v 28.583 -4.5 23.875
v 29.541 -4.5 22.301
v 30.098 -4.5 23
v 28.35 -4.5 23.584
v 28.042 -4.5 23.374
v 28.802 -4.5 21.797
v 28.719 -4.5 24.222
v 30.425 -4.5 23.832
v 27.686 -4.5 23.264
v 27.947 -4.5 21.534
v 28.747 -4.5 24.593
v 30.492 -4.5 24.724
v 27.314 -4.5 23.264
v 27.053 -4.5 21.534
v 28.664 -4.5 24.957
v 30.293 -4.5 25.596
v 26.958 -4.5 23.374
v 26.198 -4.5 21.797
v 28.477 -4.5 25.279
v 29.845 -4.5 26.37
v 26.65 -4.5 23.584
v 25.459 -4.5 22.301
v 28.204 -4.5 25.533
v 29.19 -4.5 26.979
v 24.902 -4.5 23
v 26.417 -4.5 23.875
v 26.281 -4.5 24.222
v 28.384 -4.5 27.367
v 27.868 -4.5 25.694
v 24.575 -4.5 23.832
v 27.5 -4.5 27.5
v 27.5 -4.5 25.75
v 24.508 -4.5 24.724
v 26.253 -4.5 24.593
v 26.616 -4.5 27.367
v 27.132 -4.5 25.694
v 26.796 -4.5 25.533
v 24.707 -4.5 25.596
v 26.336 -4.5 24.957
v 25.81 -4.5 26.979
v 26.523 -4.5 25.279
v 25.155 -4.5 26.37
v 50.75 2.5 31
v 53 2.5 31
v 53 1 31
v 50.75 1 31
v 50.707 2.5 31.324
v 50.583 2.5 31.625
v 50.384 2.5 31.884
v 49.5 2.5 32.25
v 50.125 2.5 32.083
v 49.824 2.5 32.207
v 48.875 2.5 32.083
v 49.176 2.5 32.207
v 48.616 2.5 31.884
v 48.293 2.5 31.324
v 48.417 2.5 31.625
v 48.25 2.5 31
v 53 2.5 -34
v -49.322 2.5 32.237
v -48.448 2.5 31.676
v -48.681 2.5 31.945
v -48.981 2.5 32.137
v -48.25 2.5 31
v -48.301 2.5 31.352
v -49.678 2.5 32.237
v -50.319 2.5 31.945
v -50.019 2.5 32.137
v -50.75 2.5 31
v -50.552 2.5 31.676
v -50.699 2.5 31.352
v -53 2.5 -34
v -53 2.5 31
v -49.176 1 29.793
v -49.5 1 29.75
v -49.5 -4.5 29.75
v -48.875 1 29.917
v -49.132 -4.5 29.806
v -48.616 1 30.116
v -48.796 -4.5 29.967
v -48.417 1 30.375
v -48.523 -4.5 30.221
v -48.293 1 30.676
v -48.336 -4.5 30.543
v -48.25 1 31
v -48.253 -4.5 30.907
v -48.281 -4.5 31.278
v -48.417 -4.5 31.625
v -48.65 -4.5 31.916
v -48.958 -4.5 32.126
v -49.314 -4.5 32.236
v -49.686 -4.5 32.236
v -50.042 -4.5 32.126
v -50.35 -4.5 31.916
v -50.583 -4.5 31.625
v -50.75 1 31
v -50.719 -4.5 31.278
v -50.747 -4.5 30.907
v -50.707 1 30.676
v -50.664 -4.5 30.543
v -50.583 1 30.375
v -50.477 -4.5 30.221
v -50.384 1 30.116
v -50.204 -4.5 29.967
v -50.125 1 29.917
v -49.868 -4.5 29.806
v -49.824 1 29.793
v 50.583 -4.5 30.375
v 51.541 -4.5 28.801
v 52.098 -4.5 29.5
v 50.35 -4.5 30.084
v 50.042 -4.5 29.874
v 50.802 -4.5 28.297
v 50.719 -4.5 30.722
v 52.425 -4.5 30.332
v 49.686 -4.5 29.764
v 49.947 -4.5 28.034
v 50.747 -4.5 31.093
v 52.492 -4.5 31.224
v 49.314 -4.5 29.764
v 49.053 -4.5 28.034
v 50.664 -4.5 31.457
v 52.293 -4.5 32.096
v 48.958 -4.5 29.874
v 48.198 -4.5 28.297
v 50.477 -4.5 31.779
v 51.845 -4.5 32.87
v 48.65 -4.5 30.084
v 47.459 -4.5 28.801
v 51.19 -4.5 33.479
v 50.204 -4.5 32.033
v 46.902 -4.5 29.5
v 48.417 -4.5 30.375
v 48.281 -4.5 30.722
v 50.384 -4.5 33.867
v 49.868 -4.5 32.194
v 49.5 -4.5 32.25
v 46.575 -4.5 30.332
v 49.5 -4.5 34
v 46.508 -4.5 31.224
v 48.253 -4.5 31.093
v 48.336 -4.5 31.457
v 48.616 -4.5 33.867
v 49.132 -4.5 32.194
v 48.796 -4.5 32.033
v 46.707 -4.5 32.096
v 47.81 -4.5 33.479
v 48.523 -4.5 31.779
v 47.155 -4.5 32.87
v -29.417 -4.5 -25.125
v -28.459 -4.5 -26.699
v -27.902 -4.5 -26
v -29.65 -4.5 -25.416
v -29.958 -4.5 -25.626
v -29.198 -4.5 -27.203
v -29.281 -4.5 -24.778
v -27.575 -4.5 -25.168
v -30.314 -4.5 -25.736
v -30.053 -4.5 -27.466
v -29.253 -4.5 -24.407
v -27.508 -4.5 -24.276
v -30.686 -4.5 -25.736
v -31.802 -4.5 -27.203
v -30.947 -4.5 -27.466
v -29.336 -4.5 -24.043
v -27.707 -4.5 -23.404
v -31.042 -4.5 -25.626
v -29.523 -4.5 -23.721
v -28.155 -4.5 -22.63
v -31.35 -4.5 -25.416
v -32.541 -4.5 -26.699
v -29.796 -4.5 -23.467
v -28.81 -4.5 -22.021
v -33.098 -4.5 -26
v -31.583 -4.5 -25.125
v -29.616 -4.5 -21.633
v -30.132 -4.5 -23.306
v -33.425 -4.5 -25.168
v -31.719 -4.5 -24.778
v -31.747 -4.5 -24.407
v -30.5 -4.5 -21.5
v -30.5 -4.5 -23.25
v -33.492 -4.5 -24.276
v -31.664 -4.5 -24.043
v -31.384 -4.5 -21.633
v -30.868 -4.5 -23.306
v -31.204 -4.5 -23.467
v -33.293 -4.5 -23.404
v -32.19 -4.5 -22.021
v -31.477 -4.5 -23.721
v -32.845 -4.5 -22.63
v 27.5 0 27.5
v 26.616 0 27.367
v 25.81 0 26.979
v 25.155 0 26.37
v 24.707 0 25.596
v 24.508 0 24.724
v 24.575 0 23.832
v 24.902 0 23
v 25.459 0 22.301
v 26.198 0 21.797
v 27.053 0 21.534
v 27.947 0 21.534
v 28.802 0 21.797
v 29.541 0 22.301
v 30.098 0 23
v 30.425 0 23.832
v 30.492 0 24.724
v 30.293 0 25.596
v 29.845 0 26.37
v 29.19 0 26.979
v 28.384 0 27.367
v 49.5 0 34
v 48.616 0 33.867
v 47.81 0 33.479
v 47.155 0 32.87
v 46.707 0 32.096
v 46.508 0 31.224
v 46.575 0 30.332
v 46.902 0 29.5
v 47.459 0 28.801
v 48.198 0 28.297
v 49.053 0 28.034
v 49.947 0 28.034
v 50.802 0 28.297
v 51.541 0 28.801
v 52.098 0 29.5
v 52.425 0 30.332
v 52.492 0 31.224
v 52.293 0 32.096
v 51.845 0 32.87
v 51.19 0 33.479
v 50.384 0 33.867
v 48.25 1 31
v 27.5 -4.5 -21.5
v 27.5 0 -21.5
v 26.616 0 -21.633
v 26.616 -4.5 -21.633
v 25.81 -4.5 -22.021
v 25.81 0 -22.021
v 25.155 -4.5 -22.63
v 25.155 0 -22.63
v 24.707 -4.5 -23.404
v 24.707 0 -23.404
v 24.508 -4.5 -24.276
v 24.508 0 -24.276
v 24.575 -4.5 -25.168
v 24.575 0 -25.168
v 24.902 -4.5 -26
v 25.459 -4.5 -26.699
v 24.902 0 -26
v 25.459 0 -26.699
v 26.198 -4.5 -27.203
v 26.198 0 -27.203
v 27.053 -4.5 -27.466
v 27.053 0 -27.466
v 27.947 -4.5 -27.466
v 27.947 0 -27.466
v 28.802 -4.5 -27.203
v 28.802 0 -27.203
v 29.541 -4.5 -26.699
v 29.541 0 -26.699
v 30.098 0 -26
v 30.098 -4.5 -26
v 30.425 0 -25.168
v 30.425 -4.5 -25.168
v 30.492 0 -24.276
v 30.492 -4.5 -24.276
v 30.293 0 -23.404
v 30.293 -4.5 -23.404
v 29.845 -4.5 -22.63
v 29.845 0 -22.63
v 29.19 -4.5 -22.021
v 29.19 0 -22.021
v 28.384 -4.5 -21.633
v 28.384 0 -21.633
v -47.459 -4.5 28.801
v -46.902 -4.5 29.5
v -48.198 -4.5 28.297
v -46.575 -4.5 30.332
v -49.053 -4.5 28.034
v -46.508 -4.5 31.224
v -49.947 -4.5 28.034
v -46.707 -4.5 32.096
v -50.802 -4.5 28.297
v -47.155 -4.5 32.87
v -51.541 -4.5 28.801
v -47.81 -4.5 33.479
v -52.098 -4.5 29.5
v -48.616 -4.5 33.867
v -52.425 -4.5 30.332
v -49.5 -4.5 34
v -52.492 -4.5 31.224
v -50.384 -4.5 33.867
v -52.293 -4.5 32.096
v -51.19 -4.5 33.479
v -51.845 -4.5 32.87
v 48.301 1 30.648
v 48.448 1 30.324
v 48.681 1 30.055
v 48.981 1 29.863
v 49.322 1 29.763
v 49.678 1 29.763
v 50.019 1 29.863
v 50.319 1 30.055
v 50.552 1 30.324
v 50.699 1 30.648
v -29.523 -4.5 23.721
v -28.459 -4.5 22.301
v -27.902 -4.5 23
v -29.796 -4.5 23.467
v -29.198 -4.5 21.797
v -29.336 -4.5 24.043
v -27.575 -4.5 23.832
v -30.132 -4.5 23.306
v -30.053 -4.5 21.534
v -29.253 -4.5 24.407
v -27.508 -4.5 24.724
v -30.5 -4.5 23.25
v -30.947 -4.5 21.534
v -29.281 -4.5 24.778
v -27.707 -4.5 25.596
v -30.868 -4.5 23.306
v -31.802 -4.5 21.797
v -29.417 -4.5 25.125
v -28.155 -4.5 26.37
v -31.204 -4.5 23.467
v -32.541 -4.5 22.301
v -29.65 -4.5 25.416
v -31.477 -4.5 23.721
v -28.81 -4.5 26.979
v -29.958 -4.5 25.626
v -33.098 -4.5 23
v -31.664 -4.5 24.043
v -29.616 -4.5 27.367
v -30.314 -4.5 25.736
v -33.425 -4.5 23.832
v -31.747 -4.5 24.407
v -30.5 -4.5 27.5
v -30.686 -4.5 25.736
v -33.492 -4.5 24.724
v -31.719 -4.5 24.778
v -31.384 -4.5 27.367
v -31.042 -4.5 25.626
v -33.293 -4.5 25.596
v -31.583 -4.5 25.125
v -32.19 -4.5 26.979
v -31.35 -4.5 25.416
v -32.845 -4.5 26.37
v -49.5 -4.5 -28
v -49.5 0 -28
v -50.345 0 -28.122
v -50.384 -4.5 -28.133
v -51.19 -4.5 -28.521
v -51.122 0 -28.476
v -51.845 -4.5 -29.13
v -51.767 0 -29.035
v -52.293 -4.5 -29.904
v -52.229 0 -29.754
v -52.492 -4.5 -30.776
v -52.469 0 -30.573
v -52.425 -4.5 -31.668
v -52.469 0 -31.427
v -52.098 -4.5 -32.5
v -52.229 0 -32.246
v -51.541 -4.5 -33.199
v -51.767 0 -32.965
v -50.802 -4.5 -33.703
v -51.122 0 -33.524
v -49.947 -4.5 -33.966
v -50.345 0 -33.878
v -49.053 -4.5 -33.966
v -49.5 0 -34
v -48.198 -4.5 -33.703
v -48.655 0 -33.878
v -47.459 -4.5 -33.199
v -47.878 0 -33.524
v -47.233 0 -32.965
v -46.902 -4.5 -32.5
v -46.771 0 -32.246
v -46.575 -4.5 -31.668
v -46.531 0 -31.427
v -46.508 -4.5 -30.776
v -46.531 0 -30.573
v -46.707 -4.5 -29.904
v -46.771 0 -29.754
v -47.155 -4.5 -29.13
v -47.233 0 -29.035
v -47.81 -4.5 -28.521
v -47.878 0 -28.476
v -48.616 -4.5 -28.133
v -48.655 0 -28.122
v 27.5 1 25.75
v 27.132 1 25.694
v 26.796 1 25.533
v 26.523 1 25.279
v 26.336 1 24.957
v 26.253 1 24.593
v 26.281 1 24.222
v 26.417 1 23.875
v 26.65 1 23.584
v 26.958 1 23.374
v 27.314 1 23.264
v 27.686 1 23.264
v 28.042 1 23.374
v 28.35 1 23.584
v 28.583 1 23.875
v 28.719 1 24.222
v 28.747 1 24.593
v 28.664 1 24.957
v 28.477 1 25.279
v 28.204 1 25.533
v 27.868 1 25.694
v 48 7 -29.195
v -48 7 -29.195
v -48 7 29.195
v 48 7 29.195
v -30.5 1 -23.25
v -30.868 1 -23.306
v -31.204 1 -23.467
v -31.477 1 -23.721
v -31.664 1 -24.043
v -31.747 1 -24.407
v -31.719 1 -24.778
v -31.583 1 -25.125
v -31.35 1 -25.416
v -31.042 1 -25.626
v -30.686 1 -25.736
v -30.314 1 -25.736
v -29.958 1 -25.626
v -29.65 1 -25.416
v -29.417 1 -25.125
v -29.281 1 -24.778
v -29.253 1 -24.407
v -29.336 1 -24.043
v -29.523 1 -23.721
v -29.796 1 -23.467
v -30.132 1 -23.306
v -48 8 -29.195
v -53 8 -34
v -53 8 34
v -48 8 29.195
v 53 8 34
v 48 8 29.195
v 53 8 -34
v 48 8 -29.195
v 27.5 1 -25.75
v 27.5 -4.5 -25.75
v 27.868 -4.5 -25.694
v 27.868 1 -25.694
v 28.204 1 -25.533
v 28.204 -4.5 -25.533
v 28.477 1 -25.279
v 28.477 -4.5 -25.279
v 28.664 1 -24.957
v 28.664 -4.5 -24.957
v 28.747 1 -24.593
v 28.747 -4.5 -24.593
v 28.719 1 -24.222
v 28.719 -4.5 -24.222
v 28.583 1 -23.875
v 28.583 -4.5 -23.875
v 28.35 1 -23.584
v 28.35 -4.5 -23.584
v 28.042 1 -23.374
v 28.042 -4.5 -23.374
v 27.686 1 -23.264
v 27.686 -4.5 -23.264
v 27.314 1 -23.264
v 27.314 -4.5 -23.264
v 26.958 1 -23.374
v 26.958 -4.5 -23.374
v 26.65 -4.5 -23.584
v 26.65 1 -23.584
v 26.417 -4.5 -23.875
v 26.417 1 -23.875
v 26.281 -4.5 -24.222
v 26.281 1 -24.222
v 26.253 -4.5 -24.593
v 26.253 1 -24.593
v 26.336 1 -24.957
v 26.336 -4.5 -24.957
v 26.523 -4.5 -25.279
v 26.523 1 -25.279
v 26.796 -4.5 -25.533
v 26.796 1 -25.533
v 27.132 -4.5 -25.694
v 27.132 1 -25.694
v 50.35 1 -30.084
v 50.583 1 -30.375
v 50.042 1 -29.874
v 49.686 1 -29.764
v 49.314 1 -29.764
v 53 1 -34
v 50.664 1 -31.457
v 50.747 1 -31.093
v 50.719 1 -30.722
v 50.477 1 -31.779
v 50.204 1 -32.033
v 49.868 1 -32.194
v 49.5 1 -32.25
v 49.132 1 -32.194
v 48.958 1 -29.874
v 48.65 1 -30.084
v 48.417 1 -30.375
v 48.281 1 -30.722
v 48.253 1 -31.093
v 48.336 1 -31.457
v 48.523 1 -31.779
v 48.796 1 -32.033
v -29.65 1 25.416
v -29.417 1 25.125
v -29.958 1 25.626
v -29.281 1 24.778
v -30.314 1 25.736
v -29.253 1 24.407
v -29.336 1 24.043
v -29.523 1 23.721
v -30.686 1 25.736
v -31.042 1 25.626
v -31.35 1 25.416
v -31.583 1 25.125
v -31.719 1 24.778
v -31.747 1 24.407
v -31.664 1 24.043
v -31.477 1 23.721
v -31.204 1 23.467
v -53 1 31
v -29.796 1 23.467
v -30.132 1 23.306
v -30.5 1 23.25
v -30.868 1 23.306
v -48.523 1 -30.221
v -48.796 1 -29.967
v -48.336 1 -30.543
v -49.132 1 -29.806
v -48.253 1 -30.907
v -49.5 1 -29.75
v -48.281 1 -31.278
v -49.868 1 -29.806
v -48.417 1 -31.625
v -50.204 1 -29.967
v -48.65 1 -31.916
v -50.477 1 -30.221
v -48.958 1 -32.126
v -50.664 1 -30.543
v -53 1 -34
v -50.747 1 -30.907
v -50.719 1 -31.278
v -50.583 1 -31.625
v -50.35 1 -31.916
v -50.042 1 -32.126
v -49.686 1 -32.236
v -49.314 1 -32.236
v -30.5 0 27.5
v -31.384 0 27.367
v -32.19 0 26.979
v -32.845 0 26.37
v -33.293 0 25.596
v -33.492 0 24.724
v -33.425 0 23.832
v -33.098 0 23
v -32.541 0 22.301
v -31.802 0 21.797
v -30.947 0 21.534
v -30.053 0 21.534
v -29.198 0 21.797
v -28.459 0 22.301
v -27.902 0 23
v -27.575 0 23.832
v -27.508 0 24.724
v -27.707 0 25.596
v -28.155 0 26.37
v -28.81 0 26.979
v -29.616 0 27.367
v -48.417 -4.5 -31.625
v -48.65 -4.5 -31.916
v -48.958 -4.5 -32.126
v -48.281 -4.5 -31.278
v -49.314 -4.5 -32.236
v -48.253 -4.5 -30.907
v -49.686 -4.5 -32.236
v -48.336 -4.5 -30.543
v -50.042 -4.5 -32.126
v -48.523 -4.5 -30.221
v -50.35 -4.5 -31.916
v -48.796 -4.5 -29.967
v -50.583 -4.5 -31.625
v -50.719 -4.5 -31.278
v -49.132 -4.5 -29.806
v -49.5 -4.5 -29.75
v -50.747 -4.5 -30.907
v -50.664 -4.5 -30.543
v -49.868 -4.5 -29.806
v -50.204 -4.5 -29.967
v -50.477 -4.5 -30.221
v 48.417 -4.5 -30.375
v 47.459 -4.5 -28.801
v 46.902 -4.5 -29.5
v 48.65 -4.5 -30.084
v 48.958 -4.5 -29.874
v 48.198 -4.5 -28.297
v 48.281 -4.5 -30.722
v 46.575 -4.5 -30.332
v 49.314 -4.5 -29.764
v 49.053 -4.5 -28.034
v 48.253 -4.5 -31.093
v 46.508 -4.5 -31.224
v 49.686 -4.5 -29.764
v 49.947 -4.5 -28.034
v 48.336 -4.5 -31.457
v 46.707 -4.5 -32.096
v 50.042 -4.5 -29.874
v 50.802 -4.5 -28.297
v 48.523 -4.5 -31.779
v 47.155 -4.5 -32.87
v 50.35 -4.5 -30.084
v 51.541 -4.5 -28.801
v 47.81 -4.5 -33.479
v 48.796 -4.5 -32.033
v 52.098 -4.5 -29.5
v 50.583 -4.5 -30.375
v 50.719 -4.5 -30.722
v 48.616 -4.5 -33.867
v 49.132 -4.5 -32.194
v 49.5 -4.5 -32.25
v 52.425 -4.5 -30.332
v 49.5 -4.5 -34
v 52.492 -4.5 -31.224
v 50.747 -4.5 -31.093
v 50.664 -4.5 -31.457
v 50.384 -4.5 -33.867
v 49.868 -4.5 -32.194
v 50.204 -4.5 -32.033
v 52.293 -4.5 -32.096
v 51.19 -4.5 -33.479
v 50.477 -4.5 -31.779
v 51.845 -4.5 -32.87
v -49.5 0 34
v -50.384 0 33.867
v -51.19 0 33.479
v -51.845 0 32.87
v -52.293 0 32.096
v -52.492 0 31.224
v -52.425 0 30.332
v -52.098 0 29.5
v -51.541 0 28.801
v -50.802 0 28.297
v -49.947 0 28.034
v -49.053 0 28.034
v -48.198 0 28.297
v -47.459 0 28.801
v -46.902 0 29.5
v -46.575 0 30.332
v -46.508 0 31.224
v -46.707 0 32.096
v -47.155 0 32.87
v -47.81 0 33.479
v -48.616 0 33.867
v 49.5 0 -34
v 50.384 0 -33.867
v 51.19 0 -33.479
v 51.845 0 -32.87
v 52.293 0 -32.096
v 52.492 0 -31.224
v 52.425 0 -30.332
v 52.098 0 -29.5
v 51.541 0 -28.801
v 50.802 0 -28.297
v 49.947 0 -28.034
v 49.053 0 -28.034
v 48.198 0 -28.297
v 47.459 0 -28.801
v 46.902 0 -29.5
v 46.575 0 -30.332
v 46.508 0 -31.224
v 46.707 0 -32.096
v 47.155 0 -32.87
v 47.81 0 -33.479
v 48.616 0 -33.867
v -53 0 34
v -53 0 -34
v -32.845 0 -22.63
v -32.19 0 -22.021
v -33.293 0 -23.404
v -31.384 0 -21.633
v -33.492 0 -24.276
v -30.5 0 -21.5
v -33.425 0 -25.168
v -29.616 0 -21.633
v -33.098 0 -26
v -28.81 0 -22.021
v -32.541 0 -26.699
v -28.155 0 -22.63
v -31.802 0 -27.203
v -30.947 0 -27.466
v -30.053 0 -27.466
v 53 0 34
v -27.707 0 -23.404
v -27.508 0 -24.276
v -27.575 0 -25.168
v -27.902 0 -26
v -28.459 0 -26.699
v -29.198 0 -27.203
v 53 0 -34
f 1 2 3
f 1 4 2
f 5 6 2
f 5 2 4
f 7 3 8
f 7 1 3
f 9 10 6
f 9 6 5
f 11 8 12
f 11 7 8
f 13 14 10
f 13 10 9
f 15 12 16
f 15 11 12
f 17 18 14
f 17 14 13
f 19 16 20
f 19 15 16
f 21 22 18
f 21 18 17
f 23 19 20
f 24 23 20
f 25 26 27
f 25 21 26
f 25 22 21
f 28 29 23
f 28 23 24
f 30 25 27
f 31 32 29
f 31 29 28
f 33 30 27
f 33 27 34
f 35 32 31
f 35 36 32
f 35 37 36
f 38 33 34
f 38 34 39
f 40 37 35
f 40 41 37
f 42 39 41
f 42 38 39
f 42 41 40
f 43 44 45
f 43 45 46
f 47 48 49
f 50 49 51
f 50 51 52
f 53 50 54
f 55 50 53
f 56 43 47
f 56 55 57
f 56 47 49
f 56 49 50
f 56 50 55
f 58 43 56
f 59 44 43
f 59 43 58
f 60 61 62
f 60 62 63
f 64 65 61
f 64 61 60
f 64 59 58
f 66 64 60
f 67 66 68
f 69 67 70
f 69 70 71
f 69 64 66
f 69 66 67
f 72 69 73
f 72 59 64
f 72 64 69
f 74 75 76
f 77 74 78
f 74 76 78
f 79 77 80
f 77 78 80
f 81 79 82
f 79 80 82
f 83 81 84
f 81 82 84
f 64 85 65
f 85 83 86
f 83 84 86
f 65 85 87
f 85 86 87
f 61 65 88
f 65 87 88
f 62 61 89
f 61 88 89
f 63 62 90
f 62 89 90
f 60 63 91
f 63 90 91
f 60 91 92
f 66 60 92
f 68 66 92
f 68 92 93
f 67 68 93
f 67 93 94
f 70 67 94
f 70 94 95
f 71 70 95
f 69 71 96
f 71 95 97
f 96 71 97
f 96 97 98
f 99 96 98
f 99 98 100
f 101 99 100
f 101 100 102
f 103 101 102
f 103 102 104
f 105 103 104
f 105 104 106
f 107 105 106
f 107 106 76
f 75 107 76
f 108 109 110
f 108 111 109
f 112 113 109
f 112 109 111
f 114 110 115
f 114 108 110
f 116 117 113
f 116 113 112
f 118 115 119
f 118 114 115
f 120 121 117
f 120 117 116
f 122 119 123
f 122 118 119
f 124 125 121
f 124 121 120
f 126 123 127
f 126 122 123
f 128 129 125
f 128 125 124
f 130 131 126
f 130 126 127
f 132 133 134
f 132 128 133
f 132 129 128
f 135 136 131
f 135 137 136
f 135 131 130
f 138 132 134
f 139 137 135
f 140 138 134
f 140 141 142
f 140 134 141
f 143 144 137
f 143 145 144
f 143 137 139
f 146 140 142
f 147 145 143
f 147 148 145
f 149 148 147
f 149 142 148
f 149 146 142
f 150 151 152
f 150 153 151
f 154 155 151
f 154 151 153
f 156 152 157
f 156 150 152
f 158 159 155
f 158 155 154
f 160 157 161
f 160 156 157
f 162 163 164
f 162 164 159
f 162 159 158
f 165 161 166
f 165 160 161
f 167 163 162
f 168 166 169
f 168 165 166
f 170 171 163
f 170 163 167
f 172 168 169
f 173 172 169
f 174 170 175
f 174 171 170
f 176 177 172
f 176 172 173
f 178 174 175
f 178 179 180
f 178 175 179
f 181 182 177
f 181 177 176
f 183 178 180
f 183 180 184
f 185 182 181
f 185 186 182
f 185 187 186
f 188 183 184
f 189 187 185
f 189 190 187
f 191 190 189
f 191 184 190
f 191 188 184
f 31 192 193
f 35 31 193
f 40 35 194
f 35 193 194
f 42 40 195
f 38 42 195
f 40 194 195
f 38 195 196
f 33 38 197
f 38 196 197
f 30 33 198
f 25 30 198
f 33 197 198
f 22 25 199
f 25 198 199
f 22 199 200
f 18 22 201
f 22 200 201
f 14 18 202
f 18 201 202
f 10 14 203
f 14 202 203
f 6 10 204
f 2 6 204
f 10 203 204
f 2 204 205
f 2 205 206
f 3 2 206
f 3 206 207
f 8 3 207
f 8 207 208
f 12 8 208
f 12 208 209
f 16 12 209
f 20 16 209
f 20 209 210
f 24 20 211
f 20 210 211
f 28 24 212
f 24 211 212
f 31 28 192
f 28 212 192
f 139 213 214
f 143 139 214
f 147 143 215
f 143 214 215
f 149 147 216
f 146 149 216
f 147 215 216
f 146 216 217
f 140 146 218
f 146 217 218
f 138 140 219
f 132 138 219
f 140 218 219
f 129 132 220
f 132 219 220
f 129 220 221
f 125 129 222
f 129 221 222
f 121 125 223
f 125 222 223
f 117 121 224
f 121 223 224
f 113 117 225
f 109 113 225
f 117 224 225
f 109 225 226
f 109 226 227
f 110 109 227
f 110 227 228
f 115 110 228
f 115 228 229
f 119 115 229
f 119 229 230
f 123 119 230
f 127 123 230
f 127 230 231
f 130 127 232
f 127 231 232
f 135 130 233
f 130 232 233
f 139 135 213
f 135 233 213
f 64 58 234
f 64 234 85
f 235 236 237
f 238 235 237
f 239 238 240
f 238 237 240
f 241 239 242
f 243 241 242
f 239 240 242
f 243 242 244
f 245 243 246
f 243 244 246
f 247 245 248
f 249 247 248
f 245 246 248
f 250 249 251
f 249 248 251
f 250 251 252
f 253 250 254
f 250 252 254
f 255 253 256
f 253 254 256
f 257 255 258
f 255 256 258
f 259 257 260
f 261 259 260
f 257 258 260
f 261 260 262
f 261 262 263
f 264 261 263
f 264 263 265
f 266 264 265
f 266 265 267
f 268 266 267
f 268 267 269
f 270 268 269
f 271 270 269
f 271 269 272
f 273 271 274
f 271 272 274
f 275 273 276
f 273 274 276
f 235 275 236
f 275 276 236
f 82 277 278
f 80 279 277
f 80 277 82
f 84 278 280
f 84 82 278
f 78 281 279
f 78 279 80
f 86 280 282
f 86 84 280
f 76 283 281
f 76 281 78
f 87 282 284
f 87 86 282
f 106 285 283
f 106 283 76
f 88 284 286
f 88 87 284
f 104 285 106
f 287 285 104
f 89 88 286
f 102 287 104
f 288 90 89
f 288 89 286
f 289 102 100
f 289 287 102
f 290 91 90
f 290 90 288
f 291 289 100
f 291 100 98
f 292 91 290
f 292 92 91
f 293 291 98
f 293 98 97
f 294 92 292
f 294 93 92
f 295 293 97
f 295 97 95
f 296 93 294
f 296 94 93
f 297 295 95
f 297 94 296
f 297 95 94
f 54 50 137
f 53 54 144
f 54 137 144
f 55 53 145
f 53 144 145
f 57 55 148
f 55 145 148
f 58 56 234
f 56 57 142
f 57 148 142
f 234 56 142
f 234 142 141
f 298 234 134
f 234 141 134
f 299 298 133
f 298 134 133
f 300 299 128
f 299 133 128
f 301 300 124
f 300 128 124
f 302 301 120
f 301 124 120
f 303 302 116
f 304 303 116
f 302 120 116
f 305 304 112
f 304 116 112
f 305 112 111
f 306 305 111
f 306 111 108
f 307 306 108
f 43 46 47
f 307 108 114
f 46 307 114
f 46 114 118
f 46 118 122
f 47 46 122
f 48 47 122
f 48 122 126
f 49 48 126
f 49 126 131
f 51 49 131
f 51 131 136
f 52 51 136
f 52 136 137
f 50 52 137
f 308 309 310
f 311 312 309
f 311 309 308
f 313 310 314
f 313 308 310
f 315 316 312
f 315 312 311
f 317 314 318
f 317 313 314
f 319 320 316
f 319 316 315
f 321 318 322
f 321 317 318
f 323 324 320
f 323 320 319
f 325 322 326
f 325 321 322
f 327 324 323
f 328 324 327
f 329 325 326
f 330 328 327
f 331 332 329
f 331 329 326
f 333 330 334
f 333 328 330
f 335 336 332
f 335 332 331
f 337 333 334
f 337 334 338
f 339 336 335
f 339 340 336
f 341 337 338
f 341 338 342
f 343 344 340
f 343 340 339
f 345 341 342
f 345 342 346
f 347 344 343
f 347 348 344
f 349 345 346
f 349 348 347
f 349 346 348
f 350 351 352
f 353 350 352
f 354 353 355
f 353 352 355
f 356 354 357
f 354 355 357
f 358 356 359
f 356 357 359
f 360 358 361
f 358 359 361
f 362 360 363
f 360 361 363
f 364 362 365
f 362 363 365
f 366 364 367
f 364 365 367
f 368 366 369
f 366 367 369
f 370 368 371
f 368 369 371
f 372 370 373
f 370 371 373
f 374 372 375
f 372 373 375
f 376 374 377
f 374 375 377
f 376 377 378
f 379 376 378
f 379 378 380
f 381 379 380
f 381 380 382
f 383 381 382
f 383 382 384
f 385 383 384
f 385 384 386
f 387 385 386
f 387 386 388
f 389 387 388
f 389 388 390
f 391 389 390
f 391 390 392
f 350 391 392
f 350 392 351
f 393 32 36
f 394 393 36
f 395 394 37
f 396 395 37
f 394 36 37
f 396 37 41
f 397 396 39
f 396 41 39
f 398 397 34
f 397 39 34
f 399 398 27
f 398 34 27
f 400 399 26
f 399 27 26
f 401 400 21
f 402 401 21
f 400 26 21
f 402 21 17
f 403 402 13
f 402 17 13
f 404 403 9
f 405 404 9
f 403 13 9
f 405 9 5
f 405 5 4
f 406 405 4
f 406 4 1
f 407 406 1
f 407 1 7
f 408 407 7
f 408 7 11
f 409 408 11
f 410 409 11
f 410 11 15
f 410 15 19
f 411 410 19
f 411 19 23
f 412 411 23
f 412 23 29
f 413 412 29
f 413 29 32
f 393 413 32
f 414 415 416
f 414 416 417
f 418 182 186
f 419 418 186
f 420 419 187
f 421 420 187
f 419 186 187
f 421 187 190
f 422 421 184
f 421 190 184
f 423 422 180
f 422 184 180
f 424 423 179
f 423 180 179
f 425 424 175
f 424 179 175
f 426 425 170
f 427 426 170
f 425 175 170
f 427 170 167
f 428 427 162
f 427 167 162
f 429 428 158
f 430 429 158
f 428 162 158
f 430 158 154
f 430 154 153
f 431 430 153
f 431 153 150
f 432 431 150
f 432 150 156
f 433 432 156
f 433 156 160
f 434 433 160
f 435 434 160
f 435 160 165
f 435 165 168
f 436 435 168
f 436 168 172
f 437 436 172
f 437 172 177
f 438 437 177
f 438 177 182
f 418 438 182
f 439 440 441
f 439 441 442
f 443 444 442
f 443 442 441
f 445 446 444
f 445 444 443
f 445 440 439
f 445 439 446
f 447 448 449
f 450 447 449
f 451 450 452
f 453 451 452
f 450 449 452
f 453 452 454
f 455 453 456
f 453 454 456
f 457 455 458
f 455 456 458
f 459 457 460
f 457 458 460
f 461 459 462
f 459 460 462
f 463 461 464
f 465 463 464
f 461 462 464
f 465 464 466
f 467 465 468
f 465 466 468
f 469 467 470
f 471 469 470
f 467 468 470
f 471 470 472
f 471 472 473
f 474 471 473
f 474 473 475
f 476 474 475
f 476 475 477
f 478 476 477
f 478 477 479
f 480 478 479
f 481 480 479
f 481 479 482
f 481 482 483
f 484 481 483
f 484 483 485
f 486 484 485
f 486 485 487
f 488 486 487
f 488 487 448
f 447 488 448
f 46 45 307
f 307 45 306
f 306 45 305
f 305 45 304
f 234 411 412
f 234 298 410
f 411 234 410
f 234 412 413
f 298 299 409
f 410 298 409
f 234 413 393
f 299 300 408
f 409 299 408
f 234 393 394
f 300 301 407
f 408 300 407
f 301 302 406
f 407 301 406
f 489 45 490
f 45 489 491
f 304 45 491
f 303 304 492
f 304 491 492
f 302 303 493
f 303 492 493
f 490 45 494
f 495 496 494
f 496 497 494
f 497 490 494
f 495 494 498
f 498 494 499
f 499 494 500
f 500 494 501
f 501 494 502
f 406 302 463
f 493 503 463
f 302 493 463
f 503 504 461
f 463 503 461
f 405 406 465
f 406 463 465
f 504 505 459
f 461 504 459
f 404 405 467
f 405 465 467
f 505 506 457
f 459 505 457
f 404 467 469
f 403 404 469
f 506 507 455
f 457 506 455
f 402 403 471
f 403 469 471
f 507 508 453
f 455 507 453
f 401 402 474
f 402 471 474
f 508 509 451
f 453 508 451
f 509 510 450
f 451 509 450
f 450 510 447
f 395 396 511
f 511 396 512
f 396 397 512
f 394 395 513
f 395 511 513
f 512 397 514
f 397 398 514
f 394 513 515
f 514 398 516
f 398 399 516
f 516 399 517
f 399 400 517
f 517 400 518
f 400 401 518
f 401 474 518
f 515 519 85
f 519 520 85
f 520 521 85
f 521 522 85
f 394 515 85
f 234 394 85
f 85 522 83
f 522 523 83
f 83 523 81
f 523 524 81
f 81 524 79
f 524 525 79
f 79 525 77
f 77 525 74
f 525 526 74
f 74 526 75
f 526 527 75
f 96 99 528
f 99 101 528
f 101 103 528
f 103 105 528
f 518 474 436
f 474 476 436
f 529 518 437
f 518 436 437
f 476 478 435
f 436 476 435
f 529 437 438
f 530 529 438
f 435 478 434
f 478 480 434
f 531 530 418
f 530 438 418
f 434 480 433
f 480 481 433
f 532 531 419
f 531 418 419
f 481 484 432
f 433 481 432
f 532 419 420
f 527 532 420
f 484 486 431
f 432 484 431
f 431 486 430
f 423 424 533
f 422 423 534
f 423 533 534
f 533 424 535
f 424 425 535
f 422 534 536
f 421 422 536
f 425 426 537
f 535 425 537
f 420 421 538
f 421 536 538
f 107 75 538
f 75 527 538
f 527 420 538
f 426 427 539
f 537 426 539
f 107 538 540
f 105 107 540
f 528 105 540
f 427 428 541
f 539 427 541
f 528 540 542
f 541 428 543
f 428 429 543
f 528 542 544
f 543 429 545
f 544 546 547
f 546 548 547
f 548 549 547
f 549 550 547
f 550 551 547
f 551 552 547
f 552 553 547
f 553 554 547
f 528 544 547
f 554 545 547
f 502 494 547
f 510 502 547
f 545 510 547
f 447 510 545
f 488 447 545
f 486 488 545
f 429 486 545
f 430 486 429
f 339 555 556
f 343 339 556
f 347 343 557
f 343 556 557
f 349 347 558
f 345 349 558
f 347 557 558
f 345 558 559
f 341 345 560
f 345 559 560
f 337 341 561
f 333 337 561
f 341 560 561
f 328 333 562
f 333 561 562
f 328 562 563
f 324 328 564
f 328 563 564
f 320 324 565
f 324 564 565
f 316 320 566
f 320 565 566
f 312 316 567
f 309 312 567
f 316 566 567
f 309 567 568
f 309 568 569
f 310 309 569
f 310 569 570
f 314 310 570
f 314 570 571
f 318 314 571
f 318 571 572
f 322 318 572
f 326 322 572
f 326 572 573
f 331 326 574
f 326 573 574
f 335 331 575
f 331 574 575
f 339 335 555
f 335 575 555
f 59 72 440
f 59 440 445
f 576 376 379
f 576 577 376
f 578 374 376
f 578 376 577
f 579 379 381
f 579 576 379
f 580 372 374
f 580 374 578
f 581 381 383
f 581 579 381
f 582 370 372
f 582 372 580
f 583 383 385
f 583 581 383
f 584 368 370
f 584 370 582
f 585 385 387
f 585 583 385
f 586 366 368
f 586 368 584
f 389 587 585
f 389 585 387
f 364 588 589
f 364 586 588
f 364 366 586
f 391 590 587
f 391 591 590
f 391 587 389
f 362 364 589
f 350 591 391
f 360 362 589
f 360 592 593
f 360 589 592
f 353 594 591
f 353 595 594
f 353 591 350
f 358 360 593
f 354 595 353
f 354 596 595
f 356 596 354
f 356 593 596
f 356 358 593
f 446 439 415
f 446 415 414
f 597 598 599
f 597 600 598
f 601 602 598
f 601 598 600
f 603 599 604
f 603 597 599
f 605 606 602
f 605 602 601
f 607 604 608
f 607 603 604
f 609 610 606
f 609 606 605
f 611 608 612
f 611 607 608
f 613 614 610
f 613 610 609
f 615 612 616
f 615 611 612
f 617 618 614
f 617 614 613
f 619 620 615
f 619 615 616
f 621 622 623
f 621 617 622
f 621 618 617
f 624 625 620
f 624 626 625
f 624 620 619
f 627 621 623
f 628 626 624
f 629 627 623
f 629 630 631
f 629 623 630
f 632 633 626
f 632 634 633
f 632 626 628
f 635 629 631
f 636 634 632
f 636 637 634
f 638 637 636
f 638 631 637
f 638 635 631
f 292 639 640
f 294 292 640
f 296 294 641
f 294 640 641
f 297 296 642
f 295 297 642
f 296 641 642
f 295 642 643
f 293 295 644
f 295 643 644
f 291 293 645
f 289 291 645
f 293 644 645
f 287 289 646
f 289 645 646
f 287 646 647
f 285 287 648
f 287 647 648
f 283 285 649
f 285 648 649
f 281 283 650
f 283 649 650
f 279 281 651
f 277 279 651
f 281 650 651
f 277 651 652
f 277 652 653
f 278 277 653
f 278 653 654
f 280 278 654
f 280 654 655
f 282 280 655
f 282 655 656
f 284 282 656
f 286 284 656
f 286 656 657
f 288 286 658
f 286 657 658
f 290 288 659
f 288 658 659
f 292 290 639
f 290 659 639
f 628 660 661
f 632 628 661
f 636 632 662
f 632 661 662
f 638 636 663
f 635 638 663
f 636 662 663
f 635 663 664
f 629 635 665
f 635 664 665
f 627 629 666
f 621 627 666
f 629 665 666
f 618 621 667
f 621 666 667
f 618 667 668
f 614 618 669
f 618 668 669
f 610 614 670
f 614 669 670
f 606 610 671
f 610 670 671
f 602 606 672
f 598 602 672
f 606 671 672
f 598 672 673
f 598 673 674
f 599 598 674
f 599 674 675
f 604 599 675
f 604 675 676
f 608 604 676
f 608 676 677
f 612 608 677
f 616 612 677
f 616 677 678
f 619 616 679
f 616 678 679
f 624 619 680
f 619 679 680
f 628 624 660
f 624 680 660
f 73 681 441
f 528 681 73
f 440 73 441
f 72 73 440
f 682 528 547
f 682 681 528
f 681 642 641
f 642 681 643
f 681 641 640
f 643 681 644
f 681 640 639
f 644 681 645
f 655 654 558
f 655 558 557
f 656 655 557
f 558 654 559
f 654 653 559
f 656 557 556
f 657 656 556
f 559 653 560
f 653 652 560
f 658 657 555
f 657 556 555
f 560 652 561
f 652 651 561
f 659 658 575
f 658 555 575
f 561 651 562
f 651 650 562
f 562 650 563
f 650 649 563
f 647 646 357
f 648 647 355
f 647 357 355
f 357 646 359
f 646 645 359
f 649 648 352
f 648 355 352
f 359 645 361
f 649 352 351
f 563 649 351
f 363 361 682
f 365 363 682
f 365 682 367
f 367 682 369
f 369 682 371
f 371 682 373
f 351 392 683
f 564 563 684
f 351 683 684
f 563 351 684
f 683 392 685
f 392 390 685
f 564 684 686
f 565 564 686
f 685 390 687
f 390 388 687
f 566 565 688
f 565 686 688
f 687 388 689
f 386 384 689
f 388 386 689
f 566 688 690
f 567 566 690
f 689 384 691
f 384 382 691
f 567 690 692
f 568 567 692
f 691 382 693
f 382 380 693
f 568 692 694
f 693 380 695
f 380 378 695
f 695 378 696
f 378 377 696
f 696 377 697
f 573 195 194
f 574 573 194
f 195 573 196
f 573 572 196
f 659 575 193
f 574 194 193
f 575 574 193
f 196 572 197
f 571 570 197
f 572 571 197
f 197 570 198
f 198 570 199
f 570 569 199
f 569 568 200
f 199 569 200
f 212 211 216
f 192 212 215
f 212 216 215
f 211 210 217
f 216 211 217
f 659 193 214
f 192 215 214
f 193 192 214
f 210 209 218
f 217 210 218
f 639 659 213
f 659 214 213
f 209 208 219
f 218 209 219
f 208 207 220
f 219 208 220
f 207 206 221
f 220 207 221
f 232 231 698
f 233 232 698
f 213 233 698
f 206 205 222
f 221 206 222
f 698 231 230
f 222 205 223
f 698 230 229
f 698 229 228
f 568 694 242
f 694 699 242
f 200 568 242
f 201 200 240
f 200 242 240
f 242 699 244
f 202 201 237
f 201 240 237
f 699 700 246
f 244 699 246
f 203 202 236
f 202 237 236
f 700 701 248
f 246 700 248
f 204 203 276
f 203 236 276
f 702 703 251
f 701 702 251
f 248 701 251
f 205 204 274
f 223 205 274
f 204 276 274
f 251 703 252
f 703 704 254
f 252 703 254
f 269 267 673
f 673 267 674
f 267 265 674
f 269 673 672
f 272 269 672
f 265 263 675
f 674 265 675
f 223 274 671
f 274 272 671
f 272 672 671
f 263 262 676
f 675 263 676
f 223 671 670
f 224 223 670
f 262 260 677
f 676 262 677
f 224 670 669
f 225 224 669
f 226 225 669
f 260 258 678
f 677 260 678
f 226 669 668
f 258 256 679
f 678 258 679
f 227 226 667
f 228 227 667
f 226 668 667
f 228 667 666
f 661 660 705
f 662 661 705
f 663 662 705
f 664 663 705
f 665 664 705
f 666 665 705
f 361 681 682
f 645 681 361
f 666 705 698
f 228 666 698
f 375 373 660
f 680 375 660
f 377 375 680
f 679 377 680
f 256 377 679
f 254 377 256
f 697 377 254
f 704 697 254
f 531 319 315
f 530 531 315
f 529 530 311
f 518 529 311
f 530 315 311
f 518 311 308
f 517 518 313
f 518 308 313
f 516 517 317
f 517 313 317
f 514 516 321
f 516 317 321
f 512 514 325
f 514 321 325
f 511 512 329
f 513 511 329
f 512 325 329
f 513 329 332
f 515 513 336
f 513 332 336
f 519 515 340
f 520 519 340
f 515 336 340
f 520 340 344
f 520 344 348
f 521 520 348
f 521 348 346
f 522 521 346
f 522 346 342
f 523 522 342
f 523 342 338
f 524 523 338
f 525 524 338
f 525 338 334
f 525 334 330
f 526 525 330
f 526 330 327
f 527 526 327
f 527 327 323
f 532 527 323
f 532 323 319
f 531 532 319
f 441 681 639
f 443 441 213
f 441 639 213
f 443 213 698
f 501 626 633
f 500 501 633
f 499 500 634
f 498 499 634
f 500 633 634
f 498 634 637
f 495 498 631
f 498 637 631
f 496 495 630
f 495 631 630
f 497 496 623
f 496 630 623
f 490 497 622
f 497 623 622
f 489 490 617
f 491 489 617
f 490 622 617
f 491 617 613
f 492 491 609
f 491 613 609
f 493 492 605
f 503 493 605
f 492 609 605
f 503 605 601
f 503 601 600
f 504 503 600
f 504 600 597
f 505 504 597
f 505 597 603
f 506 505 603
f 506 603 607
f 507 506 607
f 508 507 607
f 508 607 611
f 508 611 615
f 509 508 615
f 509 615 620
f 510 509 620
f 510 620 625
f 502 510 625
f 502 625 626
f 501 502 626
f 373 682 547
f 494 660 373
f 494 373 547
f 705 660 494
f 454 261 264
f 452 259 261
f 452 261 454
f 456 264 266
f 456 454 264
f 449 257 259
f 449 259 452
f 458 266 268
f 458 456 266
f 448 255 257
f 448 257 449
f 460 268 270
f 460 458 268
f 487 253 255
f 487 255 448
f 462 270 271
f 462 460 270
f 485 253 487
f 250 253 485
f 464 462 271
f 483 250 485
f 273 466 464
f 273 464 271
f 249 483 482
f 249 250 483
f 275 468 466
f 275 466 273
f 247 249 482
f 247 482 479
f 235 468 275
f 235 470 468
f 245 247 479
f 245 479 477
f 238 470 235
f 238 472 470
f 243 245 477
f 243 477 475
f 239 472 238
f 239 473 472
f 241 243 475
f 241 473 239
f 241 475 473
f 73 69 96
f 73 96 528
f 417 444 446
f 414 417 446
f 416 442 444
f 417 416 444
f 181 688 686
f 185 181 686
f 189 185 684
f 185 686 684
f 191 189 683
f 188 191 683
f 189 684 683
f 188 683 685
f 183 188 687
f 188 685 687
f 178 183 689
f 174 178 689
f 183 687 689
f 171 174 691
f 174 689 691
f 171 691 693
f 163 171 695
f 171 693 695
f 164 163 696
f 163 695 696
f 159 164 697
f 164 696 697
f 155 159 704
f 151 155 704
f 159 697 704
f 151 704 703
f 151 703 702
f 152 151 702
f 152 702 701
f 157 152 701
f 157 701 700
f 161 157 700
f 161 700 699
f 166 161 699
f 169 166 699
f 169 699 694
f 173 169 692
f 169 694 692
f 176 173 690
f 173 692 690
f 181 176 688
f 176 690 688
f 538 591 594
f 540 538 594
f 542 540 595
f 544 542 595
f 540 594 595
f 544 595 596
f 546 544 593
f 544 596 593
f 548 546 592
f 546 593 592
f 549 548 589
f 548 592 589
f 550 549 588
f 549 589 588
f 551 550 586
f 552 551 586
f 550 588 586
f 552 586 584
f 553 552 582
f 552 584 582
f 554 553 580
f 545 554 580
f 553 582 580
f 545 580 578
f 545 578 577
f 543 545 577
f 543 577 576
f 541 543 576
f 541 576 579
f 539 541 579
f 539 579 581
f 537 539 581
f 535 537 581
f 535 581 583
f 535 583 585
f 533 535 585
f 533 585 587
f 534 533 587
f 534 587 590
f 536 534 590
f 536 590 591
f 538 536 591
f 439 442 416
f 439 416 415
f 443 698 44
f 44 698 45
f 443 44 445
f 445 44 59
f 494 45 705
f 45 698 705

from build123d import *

# Parameters (mm, degrees)
ESQUISSE1_W             = 106
ESQUISSE1_H             = 68
BOSS_EXTRU_1_DEPTH      = 8
ESQUISSE2_R             = 3
BOSS_EXTRU_2_DEPTH      = 4.5
ESQUISSE3_R             = 1.25
ENL_V_MAT_EXTRU_1_DEPTH = 7
ESQUISSE4_W             = 106
ESQUISSE4_H             = 1.5
ENL_V_MAT_EXTRU_3_DEPTH = 65
ESQUISSE10_W            = 96
ESQUISSE10_H            = 58.390488624
ENL_V_MAT_EXTRU_5_DEPTH = 1


with BuildPart() as part:
    # Esquisse1 → Boss.-Extru.1 (new body)
    with BuildSketch(Plane(origin=(0, 0, 0), x_dir=(1, 0, 0), z_dir=(0, 1, 0))):
        Rectangle(ESQUISSE1_W, ESQUISSE1_H)
    extrude(amount=BOSS_EXTRU_1_DEPTH)

    # Esquisse2 → Boss.-Extru.2 (add)
    with BuildSketch(Plane.XZ):
        with Locations(Location((-49.5, 31, 0), (0, 0, 90))):
            Circle(ESQUISSE2_R)
        with Locations(Location((-49.5, -31, 0), (0, 0, 90))):
            Circle(ESQUISSE2_R)
        with Locations(Location((49.5, -31, 0), (0, 0, 270))):
            Circle(ESQUISSE2_R)
        with Locations(Location((49.5, 31, 0), (0, 0, 90))):
            Circle(ESQUISSE2_R)
        with Locations(Location((-30.5, 24.5, 0), (0, 0, 90))):
            Circle(ESQUISSE2_R)
        with Locations(Location((27.5, 24.5, 0), (0, 0, 90))):
            Circle(ESQUISSE2_R)
        with Locations(Location((27.5, -24.5, 0), (0, 0, 90))):
            Circle(ESQUISSE2_R)
        with Locations(Location((-30.5, -24.5, 0), (0, 0, 90))):
            Circle(ESQUISSE2_R)
    extrude(amount=BOSS_EXTRU_2_DEPTH)

    # Esquisse3 → Enlèv. mat.-Extru.1 (cut)
    with BuildSketch(Plane.XZ.offset(4.5)):
        with Locations(Location((-49.5, 31, 0), (0, 0, 270))):
            Circle(ESQUISSE3_R)
        with Locations(Location((49.5, 31, 0), (0, 0, 90))):
            Circle(ESQUISSE3_R)
        with Locations(Location((49.5, -31, 0), (0, 0, 270))):
            Circle(ESQUISSE3_R)
        with Locations(Location((-49.5, -31, 0), (0, 0, 90))):
            Circle(ESQUISSE3_R)
        with Locations(Location((-30.5, 24.5, 0), (0, 0, 270))):
            Circle(ESQUISSE3_R)
        with Locations(Location((27.5, 24.5, 0), (0, 0, 90))):
            Circle(ESQUISSE3_R)
        with Locations(Location((27.5, -24.5, 0), (0, 0, 270))):
            Circle(ESQUISSE3_R)
        with Locations(Location((-30.5, -24.5, 0), (0, 0, 90))):
            Circle(ESQUISSE3_R)
    extrude(amount=-ENL_V_MAT_EXTRU_1_DEPTH, mode=Mode.SUBTRACT)

    # Esquisse4 → Enlèv. mat.-Extru.3 (cut)
    with BuildSketch(Plane(origin=(0, 0, -34), x_dir=(-1, 0, 0), z_dir=(0, 0, -1))):
        with Locations((0, 1.75)):
            Rectangle(ESQUISSE4_W, ESQUISSE4_H)
    extrude(amount=-ENL_V_MAT_EXTRU_3_DEPTH, mode=Mode.SUBTRACT)

    # Esquisse10 → Enlèv. mat.-Extru.5 (cut)
    with BuildSketch(Plane(origin=(0, 8, 0), x_dir=(1, 0, 0), z_dir=(0, 1, 0))):
        Rectangle(ESQUISSE10_W, ESQUISSE10_H)
    extrude(amount=-ENL_V_MAT_EXTRU_5_DEPTH, mode=Mode.SUBTRACT)


solid = part.part
